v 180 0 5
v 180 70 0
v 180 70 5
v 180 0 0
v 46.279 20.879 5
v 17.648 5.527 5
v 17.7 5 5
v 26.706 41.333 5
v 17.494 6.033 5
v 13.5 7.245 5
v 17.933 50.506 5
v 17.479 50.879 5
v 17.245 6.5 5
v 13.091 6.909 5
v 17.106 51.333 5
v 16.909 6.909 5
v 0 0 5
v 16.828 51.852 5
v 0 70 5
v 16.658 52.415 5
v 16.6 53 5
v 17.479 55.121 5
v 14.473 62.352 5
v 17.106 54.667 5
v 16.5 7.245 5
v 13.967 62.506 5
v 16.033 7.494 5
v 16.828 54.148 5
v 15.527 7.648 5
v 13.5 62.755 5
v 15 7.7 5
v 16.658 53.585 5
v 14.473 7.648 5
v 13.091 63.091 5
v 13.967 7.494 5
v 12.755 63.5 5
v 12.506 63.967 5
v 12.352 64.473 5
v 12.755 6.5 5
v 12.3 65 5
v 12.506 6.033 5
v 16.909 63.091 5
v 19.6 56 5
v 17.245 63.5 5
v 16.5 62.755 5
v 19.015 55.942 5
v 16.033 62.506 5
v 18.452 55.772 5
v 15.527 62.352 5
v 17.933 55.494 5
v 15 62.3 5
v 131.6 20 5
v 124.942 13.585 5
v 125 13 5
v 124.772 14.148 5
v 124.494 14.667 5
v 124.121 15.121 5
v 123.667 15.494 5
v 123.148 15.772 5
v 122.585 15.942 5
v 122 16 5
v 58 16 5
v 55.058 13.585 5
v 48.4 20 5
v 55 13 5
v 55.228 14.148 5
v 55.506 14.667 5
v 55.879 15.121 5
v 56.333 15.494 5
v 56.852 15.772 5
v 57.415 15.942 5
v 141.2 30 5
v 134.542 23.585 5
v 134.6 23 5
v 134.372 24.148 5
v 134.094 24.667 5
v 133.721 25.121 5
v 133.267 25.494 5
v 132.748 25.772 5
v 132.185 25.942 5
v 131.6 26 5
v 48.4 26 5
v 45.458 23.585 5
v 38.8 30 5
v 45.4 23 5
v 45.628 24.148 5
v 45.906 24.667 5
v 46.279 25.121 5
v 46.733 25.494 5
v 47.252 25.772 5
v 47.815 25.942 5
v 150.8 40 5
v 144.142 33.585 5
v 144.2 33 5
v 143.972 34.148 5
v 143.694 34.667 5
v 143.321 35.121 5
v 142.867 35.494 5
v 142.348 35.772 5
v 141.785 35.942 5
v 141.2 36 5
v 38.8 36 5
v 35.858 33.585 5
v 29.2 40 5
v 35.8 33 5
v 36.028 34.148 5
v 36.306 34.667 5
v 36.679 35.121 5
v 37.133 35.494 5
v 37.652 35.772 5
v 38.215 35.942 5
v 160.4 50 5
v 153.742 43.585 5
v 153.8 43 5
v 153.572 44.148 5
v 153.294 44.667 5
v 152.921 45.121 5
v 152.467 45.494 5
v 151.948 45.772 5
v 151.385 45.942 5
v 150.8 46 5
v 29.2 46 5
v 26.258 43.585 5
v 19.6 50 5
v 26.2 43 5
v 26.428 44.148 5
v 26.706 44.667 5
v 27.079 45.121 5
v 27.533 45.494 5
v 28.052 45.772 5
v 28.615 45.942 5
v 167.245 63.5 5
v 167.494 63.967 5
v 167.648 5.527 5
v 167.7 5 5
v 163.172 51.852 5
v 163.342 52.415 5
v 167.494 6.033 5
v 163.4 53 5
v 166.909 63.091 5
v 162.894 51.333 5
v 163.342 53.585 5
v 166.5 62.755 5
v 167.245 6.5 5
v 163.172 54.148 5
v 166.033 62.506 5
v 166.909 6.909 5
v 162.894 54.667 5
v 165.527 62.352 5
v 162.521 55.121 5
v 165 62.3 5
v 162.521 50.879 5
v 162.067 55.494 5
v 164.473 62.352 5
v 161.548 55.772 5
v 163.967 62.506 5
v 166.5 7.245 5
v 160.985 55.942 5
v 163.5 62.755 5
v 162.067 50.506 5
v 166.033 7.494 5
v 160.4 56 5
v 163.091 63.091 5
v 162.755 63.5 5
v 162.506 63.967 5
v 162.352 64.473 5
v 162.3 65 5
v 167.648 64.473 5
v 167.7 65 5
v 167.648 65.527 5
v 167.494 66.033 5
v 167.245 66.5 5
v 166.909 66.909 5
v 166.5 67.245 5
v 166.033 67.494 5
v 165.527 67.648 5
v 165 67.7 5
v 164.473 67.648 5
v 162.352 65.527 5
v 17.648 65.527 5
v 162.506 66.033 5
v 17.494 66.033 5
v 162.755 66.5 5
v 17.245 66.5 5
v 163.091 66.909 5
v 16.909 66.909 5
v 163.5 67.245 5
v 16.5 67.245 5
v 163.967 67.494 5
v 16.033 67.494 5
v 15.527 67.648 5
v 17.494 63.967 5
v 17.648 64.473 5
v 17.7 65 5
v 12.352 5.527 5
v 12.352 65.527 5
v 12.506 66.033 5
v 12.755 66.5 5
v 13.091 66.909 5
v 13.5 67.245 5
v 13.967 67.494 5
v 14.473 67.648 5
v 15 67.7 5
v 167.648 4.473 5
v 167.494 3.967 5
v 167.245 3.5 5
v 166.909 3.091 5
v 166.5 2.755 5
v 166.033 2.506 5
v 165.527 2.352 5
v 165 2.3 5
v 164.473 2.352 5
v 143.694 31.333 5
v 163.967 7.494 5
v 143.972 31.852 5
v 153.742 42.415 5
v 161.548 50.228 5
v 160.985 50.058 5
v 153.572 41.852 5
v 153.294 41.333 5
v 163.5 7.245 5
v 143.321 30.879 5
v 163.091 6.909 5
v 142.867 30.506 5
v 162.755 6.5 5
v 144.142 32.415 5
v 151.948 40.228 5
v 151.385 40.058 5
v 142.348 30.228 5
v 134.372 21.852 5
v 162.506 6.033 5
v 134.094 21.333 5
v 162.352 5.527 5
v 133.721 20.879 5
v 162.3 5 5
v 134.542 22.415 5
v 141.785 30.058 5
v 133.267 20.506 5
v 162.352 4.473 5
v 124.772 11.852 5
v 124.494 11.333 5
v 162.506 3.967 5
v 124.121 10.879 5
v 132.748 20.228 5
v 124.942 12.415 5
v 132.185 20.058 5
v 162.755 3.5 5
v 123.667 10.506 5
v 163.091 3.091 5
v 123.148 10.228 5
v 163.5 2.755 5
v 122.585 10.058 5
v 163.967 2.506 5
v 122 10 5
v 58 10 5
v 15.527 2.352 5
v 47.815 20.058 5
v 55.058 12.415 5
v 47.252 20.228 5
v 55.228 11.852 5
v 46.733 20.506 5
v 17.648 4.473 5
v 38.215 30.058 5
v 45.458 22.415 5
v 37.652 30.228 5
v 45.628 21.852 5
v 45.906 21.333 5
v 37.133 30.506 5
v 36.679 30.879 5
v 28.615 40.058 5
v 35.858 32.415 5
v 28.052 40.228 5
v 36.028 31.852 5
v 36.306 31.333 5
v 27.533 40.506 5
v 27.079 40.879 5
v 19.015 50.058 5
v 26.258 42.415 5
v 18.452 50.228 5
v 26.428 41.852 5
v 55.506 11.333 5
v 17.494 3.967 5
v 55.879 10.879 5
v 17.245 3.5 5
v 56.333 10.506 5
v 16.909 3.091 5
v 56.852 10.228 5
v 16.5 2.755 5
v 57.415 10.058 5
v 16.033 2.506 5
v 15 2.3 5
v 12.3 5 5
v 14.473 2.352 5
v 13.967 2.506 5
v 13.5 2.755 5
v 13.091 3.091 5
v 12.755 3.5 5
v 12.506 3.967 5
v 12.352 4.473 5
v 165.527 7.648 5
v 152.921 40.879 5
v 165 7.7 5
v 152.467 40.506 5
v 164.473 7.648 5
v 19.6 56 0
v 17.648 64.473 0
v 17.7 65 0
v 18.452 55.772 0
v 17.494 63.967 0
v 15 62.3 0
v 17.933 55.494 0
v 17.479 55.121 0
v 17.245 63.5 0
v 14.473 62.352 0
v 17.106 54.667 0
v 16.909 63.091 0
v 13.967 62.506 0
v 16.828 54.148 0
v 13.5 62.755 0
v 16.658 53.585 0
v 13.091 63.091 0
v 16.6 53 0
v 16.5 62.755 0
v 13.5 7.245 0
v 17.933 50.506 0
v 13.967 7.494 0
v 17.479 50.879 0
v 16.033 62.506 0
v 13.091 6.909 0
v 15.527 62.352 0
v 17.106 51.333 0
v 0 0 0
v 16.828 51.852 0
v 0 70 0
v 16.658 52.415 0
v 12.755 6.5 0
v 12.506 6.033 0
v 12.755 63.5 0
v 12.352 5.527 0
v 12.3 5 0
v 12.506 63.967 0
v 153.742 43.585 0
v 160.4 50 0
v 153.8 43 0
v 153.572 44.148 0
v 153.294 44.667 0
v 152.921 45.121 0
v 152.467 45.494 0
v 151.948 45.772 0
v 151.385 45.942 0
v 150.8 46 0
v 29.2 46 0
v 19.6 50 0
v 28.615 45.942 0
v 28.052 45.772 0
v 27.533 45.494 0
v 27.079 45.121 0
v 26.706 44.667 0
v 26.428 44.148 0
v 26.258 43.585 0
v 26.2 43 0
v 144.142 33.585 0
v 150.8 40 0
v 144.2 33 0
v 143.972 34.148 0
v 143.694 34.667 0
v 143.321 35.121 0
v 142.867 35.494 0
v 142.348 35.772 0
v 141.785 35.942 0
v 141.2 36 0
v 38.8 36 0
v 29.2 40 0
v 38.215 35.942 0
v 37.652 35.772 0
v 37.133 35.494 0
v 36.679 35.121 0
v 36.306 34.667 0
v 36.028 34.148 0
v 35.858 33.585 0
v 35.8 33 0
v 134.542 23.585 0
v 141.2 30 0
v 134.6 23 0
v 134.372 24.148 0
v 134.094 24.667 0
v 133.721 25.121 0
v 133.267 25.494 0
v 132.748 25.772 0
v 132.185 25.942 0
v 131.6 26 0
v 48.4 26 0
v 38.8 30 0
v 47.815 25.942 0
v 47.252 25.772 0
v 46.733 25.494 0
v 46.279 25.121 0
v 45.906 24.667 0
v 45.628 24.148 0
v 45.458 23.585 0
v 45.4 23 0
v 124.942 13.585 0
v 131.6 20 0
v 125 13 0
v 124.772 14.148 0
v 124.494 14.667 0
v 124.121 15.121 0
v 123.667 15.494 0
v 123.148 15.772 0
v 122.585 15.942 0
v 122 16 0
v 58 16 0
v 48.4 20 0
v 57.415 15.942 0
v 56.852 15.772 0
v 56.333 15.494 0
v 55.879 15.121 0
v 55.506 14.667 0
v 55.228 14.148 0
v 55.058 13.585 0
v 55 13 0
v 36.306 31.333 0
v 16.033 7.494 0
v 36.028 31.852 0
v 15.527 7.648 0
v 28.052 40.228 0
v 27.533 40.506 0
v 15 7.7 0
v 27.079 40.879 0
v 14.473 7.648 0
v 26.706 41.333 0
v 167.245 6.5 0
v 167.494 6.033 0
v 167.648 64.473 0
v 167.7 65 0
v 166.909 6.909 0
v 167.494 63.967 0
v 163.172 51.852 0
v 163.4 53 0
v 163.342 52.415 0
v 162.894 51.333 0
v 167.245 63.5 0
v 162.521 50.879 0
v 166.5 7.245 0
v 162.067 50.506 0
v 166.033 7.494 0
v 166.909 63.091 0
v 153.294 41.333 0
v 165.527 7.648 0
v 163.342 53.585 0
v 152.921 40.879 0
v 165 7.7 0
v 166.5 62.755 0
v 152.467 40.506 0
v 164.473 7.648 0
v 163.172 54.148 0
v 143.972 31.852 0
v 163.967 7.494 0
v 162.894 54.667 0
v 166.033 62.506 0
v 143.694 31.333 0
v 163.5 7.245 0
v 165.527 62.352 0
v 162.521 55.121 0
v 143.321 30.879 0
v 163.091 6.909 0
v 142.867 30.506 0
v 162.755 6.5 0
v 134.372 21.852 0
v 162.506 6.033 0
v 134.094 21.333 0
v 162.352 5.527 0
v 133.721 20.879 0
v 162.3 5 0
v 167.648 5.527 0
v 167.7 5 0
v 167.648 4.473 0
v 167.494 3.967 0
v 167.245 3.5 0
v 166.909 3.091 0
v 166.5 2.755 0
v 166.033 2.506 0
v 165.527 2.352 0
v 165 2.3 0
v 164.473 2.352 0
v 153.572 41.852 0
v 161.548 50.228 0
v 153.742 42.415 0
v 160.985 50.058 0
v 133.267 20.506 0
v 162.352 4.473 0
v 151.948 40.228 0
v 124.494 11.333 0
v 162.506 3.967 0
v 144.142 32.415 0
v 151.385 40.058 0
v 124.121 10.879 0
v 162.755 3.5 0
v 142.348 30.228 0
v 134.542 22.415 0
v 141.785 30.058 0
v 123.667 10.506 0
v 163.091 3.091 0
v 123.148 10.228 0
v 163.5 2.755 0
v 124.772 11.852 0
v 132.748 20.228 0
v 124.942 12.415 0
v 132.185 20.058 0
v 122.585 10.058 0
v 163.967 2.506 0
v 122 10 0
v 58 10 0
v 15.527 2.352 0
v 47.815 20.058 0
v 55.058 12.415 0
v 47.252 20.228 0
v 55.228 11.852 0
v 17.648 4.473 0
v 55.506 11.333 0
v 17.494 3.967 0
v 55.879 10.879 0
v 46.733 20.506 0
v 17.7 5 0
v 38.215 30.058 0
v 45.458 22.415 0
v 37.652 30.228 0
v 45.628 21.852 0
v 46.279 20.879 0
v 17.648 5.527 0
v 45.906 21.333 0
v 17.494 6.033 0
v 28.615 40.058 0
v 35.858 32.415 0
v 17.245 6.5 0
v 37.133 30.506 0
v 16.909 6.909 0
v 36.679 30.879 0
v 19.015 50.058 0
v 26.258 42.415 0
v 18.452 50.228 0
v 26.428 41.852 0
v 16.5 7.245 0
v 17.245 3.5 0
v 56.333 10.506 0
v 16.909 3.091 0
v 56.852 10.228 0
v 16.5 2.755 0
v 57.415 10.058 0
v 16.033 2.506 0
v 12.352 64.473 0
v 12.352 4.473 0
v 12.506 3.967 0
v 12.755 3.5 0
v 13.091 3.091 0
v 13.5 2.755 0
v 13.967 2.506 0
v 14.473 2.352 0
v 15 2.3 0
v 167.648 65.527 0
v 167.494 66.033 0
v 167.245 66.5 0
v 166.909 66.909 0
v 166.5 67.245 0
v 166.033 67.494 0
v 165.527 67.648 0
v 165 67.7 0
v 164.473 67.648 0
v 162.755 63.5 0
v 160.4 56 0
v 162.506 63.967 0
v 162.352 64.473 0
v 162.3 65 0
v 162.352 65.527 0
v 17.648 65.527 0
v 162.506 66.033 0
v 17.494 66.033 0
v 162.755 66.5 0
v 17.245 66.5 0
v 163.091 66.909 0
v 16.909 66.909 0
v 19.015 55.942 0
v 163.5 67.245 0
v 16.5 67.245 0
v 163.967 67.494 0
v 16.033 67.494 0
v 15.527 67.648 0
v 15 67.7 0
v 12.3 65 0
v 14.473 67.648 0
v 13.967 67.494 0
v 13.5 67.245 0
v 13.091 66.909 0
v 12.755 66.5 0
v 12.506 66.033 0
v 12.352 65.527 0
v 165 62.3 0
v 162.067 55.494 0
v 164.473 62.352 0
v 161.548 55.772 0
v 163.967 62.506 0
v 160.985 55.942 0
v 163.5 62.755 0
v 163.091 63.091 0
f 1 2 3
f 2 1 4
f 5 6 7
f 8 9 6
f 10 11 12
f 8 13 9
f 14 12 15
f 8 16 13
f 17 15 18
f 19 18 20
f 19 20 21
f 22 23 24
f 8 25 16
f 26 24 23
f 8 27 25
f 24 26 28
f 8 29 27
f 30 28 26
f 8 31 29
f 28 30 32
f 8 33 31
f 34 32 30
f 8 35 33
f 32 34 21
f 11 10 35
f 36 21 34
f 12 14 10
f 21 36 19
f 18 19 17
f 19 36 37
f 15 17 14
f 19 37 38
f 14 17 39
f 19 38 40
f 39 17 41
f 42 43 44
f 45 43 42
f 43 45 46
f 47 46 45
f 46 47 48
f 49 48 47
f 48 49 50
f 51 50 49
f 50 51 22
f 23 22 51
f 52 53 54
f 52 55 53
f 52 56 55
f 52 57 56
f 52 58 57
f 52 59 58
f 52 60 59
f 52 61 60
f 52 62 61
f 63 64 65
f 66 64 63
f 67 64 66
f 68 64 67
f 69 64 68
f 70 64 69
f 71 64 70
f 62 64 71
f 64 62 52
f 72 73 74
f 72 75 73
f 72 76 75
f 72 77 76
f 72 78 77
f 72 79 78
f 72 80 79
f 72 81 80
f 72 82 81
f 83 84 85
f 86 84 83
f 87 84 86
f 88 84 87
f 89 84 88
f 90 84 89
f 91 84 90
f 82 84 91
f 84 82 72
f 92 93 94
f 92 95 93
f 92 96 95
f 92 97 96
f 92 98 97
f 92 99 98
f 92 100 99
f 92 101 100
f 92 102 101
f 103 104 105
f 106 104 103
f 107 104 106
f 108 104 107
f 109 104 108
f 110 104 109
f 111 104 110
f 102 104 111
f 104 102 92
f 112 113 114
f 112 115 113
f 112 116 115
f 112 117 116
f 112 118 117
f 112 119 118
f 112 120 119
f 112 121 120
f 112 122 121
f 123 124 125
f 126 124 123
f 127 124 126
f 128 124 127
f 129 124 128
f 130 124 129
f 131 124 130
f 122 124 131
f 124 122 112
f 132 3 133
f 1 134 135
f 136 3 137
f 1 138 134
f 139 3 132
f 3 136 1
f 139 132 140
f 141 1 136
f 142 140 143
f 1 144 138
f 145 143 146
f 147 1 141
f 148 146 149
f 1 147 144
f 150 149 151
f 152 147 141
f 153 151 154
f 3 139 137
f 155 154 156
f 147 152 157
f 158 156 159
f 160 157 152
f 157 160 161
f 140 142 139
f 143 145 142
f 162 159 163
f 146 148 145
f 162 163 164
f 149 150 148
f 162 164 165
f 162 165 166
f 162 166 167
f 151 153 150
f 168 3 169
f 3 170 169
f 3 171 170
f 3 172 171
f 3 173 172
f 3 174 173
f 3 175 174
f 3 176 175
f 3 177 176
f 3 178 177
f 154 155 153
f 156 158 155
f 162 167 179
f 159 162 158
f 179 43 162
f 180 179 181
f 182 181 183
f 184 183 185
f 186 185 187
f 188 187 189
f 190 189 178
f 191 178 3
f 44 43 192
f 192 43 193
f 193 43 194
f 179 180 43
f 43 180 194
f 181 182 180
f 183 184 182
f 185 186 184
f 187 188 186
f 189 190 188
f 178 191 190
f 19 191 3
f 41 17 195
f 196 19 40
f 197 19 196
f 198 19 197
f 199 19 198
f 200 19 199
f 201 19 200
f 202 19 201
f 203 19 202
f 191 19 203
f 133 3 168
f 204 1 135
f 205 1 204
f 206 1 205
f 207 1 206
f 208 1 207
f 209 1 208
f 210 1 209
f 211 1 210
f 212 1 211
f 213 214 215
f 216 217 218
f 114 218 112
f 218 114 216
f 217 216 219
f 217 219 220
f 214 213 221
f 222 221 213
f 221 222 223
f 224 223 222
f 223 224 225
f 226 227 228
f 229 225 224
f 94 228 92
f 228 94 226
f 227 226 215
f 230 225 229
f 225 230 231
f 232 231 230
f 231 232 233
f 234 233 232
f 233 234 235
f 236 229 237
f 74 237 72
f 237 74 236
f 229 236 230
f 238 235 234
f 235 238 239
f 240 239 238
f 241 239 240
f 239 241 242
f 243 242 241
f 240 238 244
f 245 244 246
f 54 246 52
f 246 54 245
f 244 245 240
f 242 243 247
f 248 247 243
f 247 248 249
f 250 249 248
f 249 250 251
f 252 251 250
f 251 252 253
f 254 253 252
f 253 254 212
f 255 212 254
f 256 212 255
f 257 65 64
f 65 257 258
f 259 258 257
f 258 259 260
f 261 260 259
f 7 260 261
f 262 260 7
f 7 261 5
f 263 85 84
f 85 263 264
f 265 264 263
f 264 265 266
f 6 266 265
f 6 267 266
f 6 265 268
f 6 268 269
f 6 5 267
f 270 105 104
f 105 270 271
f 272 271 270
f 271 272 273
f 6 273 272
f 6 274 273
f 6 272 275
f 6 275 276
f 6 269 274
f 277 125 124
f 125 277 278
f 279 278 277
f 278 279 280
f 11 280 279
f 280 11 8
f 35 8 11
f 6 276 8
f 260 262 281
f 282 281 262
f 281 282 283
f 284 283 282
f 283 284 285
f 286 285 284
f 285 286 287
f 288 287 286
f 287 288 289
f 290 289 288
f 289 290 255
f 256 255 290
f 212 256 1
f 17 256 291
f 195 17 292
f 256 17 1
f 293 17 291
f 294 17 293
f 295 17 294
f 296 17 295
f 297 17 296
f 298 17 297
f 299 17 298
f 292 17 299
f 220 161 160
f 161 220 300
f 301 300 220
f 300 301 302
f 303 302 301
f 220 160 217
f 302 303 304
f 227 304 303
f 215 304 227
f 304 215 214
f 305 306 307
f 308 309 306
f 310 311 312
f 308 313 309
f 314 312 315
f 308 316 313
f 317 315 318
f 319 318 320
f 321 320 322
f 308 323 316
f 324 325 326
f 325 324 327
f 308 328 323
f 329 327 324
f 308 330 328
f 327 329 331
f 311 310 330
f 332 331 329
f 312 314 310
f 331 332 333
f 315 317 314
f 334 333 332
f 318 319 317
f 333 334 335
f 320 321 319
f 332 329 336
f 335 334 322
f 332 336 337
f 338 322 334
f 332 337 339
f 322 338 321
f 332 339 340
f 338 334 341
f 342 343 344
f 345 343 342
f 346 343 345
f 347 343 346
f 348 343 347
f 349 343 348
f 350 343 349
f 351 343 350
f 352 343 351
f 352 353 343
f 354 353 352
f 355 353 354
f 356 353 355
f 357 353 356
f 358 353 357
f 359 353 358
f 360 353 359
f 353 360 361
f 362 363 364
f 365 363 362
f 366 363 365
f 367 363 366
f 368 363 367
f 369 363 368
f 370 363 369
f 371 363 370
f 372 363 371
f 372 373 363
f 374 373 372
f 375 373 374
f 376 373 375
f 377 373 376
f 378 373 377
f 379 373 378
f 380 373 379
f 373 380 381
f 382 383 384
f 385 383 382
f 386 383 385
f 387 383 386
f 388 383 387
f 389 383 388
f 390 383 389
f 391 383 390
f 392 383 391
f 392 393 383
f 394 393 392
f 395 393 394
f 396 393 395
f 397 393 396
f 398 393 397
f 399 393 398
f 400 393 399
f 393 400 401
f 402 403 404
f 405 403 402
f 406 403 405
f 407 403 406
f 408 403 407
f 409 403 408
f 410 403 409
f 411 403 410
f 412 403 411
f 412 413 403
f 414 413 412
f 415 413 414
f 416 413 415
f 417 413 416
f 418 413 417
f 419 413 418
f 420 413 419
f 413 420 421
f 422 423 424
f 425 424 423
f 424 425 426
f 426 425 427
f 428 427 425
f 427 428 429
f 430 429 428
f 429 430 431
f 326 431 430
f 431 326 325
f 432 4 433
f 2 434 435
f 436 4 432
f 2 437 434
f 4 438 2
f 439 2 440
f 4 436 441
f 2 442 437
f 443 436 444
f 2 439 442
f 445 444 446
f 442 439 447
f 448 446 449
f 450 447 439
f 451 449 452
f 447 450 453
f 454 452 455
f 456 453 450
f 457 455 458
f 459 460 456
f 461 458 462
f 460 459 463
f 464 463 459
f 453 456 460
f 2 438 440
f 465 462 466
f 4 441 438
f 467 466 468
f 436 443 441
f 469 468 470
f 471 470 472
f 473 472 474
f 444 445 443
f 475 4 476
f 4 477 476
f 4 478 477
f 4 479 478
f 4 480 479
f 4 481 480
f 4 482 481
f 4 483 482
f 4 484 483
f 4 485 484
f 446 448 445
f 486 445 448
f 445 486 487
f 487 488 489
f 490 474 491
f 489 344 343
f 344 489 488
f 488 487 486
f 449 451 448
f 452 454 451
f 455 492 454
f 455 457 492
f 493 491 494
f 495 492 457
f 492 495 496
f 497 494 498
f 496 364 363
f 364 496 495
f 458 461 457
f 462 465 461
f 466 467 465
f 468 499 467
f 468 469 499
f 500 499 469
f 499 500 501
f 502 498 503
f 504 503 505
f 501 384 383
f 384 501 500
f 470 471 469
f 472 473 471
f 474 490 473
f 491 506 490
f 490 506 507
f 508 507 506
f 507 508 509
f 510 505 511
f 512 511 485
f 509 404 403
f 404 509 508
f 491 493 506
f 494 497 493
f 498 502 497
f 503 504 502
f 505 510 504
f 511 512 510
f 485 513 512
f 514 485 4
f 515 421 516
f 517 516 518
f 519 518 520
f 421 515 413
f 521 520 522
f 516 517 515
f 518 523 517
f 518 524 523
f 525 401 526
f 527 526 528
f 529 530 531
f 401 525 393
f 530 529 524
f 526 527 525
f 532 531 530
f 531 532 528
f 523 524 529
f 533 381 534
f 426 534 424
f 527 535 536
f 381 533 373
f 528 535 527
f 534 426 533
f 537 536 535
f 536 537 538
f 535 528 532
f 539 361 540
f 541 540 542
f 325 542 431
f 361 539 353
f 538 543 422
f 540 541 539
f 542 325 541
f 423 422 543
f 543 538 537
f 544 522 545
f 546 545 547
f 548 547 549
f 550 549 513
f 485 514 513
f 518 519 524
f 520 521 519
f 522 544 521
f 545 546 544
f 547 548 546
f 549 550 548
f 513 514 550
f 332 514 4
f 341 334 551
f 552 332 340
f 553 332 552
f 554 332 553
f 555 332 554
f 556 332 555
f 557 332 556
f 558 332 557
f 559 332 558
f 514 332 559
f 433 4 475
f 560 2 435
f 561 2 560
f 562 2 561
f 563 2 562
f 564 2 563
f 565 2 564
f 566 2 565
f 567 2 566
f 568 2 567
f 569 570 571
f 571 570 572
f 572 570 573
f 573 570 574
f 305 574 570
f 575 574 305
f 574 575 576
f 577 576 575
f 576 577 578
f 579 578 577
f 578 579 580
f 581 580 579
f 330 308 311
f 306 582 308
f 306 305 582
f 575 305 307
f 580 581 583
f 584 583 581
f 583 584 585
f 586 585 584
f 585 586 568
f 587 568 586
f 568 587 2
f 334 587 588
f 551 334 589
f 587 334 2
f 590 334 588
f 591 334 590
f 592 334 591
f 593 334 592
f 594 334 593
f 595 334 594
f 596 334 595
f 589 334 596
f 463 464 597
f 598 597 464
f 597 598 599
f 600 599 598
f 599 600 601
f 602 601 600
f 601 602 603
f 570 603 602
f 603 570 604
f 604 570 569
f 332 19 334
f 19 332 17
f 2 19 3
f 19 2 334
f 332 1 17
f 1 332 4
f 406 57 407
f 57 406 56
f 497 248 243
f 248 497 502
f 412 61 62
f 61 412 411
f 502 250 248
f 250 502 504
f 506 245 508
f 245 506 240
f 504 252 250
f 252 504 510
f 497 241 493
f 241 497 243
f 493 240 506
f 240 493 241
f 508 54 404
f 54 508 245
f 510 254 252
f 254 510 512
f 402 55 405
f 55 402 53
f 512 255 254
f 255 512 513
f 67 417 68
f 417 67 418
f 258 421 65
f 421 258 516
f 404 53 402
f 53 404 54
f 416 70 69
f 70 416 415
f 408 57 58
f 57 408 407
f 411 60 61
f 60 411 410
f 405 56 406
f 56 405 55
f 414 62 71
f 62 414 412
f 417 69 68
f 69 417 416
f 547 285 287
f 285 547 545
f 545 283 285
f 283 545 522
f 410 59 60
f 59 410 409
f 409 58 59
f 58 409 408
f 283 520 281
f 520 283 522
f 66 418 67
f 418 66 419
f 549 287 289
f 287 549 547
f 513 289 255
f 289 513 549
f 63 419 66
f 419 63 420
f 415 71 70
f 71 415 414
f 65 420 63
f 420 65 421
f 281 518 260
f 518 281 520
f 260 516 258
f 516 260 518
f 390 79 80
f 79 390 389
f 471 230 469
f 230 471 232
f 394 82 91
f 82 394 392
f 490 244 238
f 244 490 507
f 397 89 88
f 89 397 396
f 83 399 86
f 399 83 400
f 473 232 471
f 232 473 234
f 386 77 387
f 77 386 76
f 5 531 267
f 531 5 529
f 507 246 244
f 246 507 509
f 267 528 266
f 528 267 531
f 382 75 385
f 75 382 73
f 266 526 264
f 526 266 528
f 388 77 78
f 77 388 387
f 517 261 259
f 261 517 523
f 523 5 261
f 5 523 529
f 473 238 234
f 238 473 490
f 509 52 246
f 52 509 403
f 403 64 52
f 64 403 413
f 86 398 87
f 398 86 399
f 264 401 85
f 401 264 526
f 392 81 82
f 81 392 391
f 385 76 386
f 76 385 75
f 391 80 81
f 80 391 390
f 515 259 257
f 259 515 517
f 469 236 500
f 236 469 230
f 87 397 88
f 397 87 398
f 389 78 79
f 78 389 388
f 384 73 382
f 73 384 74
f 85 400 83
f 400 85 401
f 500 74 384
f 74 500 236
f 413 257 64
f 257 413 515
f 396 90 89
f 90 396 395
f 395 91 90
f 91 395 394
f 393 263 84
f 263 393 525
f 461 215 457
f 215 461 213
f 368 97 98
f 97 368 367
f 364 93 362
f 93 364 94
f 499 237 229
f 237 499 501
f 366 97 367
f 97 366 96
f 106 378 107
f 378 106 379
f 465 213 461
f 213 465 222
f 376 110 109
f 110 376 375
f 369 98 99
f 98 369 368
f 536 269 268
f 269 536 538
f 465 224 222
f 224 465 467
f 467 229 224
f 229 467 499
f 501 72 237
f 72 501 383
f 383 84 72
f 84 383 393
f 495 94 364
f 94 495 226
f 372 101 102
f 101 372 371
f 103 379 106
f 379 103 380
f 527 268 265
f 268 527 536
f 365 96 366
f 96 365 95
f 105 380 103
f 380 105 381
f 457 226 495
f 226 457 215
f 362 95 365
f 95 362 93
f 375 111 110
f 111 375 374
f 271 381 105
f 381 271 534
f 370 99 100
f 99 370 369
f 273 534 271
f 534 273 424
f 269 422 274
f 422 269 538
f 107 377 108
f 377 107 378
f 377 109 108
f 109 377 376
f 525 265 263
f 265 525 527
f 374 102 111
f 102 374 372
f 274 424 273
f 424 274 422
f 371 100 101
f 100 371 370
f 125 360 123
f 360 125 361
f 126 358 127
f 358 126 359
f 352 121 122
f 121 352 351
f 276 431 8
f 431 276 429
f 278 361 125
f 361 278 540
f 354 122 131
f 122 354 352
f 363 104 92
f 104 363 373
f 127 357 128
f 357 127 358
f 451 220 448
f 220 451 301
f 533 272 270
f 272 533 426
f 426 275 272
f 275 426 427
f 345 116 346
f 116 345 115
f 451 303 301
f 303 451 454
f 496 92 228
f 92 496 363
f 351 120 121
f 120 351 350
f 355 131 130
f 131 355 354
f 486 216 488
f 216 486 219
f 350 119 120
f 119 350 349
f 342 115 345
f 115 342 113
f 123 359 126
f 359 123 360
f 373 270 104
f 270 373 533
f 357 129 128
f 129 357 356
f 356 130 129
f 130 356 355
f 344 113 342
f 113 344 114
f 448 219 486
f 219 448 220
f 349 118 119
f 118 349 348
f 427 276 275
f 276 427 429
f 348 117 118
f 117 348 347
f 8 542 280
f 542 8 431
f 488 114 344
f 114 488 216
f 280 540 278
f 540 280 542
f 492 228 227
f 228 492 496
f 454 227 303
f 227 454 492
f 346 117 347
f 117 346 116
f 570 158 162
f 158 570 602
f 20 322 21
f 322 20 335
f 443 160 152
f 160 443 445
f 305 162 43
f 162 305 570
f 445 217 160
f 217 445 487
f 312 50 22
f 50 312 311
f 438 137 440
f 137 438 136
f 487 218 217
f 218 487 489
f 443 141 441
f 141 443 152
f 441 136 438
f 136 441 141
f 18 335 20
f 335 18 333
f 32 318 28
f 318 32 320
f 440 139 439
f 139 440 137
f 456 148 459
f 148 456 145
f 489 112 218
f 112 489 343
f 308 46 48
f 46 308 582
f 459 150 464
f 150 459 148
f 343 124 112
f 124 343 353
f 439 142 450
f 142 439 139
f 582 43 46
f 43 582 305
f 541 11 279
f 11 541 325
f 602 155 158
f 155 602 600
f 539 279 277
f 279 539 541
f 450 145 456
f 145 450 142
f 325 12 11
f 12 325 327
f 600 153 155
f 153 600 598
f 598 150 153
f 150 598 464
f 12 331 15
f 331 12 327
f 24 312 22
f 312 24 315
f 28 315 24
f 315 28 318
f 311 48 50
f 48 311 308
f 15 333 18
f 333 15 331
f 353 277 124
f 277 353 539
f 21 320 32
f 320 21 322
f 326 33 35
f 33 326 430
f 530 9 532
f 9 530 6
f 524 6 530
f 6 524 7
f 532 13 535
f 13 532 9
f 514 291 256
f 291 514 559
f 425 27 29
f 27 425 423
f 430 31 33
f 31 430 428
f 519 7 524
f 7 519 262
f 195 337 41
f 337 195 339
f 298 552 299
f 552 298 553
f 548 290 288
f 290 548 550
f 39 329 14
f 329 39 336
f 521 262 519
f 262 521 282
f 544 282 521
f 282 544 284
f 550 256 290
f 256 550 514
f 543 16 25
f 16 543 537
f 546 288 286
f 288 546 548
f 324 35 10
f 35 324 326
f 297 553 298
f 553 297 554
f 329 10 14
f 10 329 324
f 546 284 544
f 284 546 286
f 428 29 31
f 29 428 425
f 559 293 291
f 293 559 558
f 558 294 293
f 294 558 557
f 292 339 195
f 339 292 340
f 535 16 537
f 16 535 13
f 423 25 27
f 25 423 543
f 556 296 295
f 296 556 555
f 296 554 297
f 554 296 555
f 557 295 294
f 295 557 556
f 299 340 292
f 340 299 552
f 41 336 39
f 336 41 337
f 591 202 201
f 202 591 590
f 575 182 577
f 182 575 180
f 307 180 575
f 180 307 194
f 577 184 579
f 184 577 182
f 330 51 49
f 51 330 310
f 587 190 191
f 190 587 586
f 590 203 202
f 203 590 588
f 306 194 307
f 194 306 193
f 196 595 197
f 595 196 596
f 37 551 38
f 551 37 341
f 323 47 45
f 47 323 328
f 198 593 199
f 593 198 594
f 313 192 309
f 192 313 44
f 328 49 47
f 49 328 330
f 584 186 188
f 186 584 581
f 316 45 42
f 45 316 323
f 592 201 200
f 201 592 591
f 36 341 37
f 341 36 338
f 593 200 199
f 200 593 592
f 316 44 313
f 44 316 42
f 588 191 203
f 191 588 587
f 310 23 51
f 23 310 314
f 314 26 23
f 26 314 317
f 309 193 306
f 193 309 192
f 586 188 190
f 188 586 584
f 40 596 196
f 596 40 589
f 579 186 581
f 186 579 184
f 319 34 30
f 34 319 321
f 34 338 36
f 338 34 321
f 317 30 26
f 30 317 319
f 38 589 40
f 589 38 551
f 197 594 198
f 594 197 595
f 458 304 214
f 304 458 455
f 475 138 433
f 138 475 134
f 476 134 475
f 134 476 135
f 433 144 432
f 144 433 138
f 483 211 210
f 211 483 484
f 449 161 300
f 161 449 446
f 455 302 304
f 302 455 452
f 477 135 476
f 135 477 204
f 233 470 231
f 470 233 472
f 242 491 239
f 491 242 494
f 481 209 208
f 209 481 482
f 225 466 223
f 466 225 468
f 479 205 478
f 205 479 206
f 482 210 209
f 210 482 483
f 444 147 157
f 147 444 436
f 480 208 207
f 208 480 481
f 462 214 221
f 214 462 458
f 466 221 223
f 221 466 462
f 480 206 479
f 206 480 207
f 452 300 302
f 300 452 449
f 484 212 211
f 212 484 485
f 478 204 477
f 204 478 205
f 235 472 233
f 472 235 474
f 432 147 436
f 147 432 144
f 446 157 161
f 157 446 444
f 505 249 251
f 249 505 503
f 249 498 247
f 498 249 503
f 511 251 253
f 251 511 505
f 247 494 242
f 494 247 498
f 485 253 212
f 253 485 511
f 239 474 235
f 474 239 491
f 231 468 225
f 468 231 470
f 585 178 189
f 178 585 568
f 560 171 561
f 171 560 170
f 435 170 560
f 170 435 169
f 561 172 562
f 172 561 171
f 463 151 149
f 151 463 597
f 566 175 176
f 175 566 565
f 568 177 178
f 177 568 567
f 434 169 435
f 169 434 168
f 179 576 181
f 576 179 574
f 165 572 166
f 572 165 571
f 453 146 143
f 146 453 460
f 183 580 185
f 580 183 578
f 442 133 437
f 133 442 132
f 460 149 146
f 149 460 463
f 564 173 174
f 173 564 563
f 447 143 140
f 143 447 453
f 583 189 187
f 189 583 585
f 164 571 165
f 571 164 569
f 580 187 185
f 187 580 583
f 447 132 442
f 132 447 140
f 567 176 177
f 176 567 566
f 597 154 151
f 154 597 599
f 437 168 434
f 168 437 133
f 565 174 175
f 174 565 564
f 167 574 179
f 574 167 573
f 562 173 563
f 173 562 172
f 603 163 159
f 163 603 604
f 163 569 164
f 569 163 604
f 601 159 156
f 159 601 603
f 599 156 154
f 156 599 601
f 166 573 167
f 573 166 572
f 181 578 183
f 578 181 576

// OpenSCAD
$fn = 32;

// ----------------------------------------------------------------------
// Slotted panel: 180 x 70 mm, 5 рядов of slots
// ----------------------------------------------------------------------

// --- parameters (mm) ---
panel_w = 180;            // panel width
panel_d = 70;             // panel depth
thick = 5;                // panel thickness
slot_w = 6;               // slot width
pitch0 = 10;              // first row pitch
pitch_step = 1.2;         // pitch increase per row
margin = 10;              // margin around the slot field
rows = 5;                 // number of slot rows
mount_d = 5.4;            // mounting holes
mount_x = 75;             // mounting hole offset

difference() {
  union() {
    cube([panel_w, panel_d, thick]);
  }
  /* slot rows: stadium shaped cutters, 2.5 mm clear of both faces */
  /* row 0: pitch 10, length 64 */
  hull() {
    translate([58, 13, -2.5]) cylinder(h = thick + 5, d = slot_w);
    translate([122, 13, -2.5]) cylinder(h = thick + 5, d = slot_w);
  }
  /* row 1: pitch 10, length 83.2 */
  hull() {
    translate([48.4, 23, -2.5]) cylinder(h = thick + 5, d = slot_w);
    translate([131.6, 23, -2.5]) cylinder(h = thick + 5, d = slot_w);
  }
  /* row 2: pitch 10, length 102.4 */
  hull() {
    translate([38.8, 33, -2.5]) cylinder(h = thick + 5, d = slot_w);
    translate([141.2, 33, -2.5]) cylinder(h = thick + 5, d = slot_w);
  }
  /* row 3: pitch 10, length 121.6 */
  hull() {
    translate([29.2, 43, -2.5]) cylinder(h = thick + 5, d = slot_w);
    translate([150.8, 43, -2.5]) cylinder(h = thick + 5, d = slot_w);
  }
  /* row 4: pitch 10, length 140.8 */
  hull() {
    translate([19.6, 53, -2.5]) cylinder(h = thick + 5, d = slot_w);
    translate([160.4, 53, -2.5]) cylinder(h = thick + 5, d = slot_w);
  }
  translate([15, 5, -2.5]) cylinder(h = 10, d = mount_d);
  translate([15, 65, -2.5]) cylinder(h = 10, d = mount_d);
  translate([165, 5, -2.5]) cylinder(h = 10, d = mount_d);
  translate([165, 65, -2.5]) cylinder(h = 10, d = mount_d);
}
